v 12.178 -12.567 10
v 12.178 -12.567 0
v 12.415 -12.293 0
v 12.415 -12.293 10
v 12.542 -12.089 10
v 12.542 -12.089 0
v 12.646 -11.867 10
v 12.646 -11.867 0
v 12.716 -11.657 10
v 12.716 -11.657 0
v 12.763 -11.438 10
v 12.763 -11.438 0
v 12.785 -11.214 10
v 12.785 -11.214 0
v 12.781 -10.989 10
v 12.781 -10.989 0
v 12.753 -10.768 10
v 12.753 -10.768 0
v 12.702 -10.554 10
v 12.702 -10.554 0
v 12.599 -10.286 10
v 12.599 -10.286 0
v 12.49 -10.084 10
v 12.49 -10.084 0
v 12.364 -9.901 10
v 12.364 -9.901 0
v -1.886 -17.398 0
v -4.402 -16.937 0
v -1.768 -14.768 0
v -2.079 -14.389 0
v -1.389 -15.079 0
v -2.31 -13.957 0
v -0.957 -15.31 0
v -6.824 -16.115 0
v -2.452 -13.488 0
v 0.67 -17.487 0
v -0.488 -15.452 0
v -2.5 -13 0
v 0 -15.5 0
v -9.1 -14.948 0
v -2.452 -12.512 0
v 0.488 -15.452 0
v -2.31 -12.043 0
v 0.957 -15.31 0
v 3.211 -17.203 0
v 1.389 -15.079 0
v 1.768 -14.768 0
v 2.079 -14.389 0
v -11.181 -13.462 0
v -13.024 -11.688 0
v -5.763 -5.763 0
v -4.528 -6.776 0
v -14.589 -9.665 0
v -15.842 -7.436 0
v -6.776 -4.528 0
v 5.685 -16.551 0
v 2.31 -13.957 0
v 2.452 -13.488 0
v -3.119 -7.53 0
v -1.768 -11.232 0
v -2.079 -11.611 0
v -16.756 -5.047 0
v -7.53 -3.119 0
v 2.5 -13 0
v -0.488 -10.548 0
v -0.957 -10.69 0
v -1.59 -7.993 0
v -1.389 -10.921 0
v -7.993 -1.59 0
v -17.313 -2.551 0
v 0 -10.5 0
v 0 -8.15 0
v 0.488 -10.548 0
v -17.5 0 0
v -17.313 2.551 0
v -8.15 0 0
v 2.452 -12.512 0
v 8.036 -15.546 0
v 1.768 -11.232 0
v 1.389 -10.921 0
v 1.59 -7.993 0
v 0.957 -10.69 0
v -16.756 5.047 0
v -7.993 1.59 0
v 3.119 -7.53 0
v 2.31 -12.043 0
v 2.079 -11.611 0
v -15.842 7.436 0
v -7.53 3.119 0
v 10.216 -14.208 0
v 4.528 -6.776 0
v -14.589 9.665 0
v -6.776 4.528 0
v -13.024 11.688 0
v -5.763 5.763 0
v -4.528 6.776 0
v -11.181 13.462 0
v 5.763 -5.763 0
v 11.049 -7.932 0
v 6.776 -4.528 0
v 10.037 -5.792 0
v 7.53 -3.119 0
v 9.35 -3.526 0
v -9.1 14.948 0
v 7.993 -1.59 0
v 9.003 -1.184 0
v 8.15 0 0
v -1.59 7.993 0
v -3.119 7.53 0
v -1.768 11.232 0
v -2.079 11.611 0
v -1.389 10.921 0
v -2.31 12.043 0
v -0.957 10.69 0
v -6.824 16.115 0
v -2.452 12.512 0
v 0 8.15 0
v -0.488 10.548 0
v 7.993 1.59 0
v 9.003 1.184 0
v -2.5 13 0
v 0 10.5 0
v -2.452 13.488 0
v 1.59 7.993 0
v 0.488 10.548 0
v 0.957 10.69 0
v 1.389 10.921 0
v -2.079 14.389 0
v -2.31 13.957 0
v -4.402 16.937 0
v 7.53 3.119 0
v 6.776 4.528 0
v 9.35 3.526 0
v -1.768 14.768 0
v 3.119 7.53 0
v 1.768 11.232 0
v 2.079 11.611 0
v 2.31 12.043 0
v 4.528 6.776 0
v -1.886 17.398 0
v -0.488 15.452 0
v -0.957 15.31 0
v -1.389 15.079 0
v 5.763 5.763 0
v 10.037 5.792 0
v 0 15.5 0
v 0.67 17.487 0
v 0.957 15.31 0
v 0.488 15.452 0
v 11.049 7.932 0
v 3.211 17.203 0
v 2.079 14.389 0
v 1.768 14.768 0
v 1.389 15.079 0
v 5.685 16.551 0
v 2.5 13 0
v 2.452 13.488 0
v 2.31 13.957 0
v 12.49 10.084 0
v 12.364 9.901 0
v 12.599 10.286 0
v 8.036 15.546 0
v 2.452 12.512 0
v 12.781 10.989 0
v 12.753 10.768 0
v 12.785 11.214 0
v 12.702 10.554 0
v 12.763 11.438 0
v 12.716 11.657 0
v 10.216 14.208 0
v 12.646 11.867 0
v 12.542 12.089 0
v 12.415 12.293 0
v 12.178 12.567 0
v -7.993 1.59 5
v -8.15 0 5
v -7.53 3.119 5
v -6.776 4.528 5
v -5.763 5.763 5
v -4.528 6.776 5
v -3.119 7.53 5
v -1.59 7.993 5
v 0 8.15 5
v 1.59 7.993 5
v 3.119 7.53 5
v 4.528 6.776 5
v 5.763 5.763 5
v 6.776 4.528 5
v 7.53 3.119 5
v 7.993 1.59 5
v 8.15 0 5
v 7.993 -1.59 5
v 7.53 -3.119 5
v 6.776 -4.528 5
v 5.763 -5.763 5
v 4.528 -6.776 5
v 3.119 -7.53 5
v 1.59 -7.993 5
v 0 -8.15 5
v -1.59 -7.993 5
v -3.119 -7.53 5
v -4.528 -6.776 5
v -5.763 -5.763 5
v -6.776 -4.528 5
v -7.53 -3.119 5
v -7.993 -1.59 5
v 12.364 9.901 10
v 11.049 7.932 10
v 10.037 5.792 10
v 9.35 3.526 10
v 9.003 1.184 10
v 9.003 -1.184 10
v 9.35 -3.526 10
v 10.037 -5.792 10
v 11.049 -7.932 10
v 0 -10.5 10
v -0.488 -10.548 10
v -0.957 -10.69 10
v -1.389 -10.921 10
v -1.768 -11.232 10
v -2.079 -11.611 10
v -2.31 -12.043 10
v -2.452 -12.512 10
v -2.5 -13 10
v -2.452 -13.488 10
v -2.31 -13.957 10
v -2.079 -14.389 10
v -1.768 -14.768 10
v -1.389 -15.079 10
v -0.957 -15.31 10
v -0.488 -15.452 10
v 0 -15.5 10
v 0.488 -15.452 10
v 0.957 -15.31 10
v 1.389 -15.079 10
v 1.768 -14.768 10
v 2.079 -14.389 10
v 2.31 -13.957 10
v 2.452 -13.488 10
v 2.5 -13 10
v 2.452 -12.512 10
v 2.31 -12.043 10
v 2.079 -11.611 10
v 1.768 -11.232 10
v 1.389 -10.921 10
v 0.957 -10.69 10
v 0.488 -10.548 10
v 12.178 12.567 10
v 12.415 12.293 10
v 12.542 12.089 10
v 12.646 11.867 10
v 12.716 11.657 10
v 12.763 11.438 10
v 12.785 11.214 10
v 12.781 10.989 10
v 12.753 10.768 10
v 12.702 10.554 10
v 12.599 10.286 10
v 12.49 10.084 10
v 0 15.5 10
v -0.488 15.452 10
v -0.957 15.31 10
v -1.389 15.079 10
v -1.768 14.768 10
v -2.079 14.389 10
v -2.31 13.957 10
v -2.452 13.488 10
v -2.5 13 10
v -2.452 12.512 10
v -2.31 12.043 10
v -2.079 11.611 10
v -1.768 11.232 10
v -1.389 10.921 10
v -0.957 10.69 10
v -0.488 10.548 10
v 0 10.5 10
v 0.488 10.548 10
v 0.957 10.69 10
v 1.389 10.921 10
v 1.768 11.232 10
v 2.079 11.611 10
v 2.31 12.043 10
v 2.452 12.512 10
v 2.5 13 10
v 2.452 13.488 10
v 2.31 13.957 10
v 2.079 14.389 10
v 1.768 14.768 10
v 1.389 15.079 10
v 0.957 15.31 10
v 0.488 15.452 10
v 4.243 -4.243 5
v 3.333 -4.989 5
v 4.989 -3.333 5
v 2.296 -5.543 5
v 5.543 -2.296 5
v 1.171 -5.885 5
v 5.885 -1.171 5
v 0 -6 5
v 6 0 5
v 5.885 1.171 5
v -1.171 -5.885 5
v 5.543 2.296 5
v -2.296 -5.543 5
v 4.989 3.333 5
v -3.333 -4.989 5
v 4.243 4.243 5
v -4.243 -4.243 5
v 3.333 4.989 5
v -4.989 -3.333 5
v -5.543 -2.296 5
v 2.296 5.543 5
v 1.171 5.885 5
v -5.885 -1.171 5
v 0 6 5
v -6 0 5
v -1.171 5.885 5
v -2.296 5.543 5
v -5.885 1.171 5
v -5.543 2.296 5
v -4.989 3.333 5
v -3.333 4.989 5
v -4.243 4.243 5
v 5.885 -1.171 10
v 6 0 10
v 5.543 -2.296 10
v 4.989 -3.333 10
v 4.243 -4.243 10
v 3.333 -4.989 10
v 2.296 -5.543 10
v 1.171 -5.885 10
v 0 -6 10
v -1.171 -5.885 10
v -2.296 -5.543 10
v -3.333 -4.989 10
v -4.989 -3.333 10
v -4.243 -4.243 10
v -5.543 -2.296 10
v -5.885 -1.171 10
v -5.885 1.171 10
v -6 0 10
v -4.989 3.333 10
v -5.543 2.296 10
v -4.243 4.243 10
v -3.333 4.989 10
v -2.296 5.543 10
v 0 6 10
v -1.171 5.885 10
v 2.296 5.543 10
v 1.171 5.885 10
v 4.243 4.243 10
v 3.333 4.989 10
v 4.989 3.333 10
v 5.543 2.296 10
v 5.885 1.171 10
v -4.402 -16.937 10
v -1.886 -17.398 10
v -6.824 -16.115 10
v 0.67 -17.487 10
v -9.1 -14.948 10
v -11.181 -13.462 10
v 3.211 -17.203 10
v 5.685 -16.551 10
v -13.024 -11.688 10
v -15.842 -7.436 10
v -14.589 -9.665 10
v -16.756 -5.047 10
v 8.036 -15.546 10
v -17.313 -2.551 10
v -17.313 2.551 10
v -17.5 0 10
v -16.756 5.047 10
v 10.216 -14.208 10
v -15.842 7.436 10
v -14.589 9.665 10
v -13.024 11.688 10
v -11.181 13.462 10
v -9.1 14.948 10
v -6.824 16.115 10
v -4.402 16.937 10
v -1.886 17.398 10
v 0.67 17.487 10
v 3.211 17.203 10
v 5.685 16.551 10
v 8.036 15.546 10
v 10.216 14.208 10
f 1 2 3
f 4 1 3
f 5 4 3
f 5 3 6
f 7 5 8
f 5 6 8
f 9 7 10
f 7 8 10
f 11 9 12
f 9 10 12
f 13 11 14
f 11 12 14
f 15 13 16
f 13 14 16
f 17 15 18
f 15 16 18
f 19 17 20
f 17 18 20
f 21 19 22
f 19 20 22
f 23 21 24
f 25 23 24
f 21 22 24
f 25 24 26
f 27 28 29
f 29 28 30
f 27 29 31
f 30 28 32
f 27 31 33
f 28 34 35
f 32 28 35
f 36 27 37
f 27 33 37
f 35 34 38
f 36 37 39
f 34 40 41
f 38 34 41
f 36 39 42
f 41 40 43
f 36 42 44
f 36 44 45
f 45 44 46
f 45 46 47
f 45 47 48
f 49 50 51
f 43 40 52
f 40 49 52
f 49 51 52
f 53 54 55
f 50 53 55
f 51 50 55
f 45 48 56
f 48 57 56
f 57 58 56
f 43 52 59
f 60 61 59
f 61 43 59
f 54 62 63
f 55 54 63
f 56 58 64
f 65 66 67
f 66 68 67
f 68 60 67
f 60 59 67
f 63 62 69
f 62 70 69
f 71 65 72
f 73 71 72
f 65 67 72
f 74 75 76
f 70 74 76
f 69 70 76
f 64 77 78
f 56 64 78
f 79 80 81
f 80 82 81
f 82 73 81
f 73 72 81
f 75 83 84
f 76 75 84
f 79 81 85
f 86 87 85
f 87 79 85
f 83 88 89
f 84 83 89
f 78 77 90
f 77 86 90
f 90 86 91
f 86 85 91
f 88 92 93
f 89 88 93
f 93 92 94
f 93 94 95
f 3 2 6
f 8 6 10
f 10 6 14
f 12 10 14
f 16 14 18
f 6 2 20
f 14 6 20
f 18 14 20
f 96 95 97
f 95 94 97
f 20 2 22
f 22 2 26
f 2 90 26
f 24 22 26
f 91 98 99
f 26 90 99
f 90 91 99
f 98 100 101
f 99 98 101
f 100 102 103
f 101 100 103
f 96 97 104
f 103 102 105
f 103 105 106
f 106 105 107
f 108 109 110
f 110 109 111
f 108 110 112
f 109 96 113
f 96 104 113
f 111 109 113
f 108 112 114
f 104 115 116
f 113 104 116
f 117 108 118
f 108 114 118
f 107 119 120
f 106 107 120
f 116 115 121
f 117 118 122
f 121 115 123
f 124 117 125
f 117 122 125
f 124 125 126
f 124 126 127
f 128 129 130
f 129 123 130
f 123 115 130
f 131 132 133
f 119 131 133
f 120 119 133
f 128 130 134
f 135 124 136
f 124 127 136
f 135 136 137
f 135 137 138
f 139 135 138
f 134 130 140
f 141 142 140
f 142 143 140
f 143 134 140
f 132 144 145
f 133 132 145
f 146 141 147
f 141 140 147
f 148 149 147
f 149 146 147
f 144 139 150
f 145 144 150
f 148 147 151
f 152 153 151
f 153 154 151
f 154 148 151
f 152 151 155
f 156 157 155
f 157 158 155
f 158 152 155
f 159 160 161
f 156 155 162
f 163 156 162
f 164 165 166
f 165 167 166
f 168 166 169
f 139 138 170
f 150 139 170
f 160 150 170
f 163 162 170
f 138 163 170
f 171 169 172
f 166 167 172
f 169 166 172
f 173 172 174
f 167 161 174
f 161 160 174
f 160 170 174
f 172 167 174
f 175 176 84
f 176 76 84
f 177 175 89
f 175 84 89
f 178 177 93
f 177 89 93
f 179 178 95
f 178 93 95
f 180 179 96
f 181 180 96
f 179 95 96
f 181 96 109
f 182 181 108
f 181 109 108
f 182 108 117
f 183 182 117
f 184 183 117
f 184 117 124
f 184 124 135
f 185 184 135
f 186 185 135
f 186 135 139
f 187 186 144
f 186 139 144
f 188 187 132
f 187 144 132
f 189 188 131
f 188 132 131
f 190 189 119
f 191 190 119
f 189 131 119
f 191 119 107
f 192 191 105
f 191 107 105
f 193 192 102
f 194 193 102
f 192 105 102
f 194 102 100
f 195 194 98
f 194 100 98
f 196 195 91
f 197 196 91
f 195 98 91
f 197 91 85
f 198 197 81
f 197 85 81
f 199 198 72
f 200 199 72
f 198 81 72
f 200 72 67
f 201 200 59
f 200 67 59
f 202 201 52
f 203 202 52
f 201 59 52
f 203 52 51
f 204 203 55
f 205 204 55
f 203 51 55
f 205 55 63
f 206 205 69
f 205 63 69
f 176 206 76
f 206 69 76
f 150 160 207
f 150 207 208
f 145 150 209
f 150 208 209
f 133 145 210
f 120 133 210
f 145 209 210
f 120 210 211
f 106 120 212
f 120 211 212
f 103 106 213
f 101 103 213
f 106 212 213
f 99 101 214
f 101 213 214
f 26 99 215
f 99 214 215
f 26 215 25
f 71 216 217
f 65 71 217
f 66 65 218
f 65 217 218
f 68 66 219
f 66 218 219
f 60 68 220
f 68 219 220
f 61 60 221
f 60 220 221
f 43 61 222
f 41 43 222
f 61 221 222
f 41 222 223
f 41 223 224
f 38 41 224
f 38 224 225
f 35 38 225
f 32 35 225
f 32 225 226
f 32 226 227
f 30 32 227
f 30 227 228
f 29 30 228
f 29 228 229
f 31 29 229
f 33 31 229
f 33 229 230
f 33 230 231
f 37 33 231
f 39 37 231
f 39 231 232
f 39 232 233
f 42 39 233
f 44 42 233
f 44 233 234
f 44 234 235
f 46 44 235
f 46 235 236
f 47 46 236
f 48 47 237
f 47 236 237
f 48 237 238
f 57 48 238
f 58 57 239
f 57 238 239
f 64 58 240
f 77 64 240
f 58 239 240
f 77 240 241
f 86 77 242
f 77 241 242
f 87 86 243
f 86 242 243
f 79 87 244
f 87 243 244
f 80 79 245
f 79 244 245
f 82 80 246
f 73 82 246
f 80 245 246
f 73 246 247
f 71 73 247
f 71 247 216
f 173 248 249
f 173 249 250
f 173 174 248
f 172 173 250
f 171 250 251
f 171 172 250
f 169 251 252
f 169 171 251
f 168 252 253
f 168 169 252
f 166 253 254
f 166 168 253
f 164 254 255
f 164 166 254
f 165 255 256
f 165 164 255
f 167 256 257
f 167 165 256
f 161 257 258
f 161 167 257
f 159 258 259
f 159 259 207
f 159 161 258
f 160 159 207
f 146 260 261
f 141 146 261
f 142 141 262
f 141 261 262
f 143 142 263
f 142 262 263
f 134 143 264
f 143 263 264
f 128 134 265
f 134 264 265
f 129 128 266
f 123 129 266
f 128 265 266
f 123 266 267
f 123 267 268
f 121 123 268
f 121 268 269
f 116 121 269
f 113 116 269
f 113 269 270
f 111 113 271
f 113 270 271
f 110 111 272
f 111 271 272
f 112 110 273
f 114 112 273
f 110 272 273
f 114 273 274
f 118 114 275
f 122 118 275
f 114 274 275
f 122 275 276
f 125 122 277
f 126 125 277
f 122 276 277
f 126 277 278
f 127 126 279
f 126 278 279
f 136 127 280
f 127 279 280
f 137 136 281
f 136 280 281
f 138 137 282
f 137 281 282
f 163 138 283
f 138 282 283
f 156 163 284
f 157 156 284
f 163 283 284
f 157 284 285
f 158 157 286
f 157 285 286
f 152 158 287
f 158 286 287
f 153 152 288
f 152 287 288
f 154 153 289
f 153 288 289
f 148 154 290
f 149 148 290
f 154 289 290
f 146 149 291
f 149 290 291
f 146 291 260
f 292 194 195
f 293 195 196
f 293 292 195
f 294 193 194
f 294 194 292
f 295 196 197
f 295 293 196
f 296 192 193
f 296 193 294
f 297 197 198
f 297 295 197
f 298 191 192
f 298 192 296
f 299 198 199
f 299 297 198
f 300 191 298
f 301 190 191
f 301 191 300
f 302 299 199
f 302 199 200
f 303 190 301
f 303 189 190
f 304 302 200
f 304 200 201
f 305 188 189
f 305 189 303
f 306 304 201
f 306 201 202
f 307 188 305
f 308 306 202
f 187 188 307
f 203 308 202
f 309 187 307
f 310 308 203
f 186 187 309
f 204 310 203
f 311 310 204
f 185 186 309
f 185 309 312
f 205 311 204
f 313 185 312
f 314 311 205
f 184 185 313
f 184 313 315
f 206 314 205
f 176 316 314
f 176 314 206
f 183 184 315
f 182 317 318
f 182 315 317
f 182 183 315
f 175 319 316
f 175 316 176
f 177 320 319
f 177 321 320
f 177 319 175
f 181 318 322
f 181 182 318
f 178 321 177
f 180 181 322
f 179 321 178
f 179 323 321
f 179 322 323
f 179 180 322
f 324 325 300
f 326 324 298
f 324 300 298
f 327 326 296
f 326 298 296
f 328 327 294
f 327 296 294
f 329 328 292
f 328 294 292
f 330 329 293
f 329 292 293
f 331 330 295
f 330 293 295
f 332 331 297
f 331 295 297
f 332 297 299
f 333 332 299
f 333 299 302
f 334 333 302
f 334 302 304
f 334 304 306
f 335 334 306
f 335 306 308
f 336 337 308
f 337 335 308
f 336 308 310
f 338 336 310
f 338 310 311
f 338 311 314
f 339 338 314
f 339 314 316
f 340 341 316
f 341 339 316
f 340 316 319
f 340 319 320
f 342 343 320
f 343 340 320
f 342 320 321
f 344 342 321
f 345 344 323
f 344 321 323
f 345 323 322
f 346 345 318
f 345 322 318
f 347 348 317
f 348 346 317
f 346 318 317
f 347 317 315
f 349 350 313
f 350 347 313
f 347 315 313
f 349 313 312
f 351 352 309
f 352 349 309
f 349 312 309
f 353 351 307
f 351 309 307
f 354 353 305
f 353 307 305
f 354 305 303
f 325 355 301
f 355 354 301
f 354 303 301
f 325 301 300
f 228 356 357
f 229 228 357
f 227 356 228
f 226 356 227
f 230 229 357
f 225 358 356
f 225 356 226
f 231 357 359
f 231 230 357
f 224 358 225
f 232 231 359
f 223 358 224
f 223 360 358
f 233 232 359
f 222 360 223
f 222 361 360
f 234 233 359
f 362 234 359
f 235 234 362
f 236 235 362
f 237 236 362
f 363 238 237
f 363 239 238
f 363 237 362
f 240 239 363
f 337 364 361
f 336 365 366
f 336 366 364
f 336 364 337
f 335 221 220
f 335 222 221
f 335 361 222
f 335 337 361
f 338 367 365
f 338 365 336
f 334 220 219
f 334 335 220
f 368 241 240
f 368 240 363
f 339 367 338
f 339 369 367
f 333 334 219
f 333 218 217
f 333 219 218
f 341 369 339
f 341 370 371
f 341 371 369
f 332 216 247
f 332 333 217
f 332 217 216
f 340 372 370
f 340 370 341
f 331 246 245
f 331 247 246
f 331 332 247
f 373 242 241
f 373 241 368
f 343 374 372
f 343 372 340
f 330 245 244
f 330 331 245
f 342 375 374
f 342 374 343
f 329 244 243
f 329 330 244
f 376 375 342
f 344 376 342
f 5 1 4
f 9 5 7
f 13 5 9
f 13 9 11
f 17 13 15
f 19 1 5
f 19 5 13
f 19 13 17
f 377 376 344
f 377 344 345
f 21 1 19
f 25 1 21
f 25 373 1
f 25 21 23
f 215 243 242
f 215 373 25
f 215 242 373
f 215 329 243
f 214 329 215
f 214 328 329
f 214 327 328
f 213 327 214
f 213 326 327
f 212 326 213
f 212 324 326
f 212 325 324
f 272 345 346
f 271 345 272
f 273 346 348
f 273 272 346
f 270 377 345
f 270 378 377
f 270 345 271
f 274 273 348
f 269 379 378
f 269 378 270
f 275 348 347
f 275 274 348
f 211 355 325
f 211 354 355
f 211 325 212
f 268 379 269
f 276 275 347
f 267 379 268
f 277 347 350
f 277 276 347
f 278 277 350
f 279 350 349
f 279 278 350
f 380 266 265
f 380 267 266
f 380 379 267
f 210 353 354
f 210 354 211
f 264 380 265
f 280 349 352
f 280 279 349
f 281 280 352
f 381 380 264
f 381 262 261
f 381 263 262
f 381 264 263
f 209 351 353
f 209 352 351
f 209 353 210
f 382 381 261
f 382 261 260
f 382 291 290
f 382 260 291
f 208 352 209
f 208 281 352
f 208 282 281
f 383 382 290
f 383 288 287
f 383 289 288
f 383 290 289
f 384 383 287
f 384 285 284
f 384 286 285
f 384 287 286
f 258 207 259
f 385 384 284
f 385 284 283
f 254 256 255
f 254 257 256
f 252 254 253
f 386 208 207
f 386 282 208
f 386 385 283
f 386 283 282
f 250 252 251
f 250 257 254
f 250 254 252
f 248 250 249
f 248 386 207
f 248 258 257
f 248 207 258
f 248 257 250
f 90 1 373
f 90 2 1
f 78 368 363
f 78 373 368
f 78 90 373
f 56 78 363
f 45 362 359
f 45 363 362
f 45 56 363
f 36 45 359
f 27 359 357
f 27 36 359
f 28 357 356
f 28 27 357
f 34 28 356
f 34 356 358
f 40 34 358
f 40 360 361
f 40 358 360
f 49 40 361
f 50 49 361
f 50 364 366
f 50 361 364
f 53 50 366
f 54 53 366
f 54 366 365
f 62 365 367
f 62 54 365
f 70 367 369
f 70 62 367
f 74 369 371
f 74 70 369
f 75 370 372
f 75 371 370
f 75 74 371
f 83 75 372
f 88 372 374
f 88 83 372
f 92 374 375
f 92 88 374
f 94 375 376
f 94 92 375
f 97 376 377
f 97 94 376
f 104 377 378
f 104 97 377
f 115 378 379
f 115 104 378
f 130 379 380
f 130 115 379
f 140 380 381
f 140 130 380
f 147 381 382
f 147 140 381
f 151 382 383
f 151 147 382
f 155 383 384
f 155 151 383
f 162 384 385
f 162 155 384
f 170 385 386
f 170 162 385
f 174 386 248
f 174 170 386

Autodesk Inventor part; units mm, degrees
ref_plane "YZ Plane" through (0, 0, 0) normal (1, 0, 0) x (0, 1, 0)
ref_plane "XZ Plane" through (0, 0, 0) normal (0, 1, 0) x (-1, 0, 0)
ref_plane "XY Plane" through (0, 0, 0) normal (0, 0, 1) x (1, 0, 0)
sketch "Sketch1" plane through (0, 0, 0) normal (0, 0, 1) x (1, 0, 0)
  circle A0 centre (0, 0) radius 6
  circle A1 centre (0, 0) radius 17.5
  dimension "d0" = 12
  dimension "d1" = 35
extrude "Extrusion1" add sketch "Sketch1" along normal blind 10
sketch "Sketch4" plane through (0, 0, 0) normal (0, 0, -1) x (-1, 0, 0)
  circle A0 centre (0, 0) radius 13 construction
  point P0 (0, -13)
  point P1 (0, 13)
  dimension "d7" = 26
hole "Hole1" at (0, -13, 0) at (0, 13, 0) direction (0, 0, 1) diameter 5 end through all
sketch "Sketch5" plane through (0, 0, 0) normal (0, 0, -1) x (-1, 0, 0)
  circle A0 centre (0, 0) radius 8.15
  dimension "d15" = 16.3
extrude "Extrusion3" cut sketch "Sketch5" against normal blind 5
sketch "Sketch6" plane through (0, 0, 10) normal (0, 0, 1) x (1, 0, 0)
  arc A0 (25.0591, 16.1) -> (25.0591, -16.1) centre (25.0591, 0) ccw projected
  arc A1 (25.0591, 17.1) -> (25.0591, -17.1) centre (25.0591, 0) ccw
  circle A2 centre (0, 0) radius 17.5 projected
  point P0 (12.8057, 11.9274)
  point P1 (12.8057, -11.9274)
  point P2 (13.4681, 11.174)
  point P3 (13.4681, -11.174)
  dimension "d22" = 1
extrude "Extrusion4" cut sketch "Sketch6" against normal through all contours A2 A0
fillet "Fillet1" radius 2 2 edges at (13.4681, -11.174, 5) (13.4681, 11.174, 5)
properties part number "Suport_Rulment" material "ABS Plastic"
